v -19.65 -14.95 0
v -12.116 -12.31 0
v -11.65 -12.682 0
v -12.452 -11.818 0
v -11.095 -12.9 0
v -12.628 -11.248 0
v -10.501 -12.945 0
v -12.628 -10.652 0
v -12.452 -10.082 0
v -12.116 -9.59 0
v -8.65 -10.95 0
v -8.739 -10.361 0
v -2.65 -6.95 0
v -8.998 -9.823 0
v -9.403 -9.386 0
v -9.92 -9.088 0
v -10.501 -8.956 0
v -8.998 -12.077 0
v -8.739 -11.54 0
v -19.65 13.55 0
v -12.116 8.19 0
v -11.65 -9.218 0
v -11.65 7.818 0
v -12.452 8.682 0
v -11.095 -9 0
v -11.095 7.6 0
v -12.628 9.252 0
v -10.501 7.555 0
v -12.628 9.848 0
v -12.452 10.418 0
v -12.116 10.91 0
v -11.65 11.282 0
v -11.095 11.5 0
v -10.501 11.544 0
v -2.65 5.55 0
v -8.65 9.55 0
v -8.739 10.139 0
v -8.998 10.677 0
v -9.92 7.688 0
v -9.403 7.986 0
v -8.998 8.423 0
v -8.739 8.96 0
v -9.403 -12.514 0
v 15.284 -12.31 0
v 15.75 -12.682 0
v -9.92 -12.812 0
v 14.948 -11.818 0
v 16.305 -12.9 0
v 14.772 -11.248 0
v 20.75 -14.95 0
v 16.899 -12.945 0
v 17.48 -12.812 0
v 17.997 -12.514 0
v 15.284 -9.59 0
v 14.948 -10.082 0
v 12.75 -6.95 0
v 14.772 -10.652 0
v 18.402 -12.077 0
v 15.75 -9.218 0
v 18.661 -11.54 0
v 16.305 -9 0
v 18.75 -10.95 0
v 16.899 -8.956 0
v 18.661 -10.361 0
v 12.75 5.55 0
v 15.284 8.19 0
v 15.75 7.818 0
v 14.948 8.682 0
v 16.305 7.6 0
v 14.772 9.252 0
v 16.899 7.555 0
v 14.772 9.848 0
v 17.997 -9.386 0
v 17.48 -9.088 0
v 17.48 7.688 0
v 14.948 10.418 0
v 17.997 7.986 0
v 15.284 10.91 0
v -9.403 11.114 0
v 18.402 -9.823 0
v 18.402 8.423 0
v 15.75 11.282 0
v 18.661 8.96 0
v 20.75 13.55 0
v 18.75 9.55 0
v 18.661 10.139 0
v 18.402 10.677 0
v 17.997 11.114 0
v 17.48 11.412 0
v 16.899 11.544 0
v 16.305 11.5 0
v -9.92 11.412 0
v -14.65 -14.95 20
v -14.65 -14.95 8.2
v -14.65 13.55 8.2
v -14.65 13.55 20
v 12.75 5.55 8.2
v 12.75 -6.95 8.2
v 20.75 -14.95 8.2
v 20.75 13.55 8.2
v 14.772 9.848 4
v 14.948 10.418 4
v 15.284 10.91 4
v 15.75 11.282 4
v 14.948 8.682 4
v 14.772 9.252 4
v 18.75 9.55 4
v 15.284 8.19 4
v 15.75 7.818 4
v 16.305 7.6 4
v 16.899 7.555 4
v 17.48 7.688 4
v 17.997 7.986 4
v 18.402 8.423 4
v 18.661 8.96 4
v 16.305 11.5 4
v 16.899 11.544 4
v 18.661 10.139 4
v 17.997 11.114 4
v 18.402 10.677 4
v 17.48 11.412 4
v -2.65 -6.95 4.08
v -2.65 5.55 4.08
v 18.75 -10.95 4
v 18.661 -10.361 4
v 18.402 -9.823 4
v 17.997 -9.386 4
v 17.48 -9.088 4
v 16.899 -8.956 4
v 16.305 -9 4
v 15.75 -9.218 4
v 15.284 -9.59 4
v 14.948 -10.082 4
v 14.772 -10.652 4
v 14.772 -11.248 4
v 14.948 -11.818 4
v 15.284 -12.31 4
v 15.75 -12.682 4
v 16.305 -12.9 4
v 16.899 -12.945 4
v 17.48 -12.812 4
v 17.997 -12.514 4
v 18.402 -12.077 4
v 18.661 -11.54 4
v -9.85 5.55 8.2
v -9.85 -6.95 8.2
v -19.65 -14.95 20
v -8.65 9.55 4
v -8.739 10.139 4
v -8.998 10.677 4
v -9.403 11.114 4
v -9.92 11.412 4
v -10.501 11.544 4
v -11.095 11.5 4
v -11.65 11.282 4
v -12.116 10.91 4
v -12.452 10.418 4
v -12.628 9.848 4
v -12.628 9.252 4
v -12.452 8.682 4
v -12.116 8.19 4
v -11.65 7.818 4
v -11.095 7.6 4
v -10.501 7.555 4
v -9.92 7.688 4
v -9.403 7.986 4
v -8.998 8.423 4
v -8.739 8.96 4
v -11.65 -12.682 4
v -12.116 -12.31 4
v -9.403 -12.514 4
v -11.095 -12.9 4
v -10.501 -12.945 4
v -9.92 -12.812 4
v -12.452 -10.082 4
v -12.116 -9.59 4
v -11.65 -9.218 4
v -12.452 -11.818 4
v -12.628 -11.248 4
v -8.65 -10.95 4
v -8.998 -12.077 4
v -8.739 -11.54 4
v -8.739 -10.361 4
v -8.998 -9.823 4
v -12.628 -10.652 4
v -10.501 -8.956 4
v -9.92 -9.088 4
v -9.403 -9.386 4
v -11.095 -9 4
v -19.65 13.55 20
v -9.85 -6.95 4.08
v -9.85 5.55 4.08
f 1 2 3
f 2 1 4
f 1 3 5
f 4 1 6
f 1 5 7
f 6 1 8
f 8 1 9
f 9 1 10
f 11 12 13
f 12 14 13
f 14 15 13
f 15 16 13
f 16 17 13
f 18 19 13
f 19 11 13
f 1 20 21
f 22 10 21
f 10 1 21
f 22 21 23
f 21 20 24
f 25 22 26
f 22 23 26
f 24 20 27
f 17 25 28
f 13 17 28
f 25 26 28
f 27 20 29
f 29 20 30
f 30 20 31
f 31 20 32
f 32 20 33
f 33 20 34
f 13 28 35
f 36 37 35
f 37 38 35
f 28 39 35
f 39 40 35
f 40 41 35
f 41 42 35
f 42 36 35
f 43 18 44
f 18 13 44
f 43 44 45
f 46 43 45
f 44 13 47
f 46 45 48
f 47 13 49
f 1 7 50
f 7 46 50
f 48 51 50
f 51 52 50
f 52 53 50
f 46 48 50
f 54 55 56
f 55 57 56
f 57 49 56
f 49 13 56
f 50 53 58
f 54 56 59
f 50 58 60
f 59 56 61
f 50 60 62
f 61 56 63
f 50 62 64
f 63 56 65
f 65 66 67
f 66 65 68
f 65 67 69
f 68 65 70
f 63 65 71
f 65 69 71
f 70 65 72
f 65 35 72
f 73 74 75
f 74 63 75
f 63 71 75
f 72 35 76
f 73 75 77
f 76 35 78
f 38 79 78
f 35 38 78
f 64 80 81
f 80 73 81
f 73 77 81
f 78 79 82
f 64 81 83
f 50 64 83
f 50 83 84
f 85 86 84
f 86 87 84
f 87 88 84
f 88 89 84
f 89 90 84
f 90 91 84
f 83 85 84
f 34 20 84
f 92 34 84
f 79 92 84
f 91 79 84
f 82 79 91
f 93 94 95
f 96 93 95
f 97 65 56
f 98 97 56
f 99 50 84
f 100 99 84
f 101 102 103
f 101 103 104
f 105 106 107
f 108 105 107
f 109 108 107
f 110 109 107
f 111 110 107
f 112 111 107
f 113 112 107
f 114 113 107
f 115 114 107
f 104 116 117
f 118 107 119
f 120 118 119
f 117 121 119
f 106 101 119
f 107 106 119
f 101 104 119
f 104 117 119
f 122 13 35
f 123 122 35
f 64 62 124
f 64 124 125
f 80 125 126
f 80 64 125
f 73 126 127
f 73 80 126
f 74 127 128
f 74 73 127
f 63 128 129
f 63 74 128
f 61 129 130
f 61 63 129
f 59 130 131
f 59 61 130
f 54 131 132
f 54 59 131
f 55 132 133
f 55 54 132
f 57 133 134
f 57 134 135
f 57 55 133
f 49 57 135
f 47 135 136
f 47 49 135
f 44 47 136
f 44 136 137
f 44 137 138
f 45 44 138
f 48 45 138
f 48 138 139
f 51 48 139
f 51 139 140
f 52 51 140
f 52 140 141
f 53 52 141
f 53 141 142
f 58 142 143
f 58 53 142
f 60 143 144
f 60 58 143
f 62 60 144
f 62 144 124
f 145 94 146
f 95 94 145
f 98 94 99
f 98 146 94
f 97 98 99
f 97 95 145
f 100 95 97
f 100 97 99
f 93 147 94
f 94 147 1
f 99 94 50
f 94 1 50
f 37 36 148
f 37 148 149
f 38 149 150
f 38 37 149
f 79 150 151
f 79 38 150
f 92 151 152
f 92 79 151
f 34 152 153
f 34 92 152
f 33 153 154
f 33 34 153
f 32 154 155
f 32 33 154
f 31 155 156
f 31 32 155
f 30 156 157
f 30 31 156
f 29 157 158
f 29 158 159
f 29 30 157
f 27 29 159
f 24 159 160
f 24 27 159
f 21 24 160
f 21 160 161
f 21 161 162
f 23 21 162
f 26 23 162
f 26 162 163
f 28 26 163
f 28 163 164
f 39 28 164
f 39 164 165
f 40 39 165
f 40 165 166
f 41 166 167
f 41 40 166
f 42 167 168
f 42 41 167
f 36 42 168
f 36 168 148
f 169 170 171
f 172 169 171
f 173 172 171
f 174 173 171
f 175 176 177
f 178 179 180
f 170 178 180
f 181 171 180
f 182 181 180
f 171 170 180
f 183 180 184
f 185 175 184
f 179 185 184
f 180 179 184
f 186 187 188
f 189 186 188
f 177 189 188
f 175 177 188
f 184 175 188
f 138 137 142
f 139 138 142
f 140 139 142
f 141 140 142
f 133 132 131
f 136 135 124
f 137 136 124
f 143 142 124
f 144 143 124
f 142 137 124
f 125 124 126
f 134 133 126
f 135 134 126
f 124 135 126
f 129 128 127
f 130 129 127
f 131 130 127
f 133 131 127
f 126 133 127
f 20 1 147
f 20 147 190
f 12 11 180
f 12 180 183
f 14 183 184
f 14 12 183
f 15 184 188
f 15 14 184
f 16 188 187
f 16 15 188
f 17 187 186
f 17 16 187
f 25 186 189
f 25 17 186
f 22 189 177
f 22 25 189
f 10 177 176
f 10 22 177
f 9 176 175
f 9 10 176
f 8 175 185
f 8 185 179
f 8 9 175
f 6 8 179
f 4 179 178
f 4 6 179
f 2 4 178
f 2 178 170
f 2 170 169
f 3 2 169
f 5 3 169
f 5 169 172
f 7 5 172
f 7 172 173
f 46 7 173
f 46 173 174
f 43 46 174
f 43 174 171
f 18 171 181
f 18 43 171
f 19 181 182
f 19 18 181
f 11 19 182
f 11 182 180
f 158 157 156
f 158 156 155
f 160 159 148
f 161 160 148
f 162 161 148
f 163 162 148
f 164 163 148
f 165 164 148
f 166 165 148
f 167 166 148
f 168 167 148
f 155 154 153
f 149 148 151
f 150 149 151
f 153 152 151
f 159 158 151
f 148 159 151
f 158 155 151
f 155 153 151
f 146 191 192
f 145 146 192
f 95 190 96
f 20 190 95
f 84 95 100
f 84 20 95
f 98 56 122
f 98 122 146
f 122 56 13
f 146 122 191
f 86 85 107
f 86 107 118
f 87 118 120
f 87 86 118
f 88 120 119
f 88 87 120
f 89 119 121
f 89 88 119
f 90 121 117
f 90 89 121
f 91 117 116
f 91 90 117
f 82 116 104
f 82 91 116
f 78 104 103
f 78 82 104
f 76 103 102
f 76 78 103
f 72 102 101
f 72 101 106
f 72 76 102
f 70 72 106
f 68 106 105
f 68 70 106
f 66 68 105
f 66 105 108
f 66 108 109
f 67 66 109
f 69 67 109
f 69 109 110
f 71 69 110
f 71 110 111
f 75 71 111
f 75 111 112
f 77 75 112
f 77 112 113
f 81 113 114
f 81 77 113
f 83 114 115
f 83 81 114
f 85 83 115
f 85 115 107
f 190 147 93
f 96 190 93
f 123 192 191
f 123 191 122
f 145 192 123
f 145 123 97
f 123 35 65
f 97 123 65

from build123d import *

# Parameters (mm, degrees)
F0_W     = 35.4
F0_H     = 28.5
F0_R     = 2
F1_DEPTH = 8.2
F0_W_2   = 5
F2_DEPTH = 20
F0_W_3   = 7.2
F0_H_2   = 12.5
F3_DEPTH = 4.08
F4_DEPTH = 4


with BuildPart() as f1:
    # F0 (on Top) → F1 (new body)
    with BuildSketch(Plane.XY):
        with Locations((3.049638, -0.700136)):
            Rectangle(F0_W, F0_H)
        with Locations((-10.650362, -10.950136)):
            Circle(F0_R, mode=Mode.SUBTRACT)
        with Locations((16.749638, -10.950136)):
            Circle(F0_R, mode=Mode.SUBTRACT)
        with Locations((-10.650362, 9.549864)):
            Circle(F0_R, mode=Mode.SUBTRACT)
        Polygon((-9.850362, -6.950136), (-9.850362, 5.549864), (-2.650362, 5.549864), (12.749638, 5.549864), (12.749638, -6.950136), (-2.650362, -6.950136), align=None, mode=Mode.SUBTRACT)
        with Locations((16.749638, 9.549864)):
            Circle(F0_R, mode=Mode.SUBTRACT)
        with Locations((-10.650362, 9.549864)):
            Circle(F0_R)
        with Locations((16.749638, 9.549864)):
            Circle(F0_R)
        with Locations((16.749638, -10.950136)):
            Circle(F0_R)
        with Locations((-10.650362, -10.950136)):
            Circle(F0_R)
    extrude(amount=F1_DEPTH)

    # F0 (on Top) → F2 (join)
    with BuildSketch(Plane.XY):
        with Locations((-17.150362, -0.700136)):
            Rectangle(F0_W_2, F0_H)
    extrude(amount=F2_DEPTH)

    # F0 (on Top) → F3 (join)
    with BuildSketch(Plane.XY):
        with Locations((-6.250362, -0.700136)):
            Rectangle(F0_W_3, F0_H_2)
    extrude(amount=F3_DEPTH)

    # F0 (on Top) → F4 (cut)
    with BuildSketch(Plane.XY):
        with Locations((-10.650362, -10.950136)):
            Circle(F0_R)
        with Locations((16.749638, -10.950136)):
            Circle(F0_R)
        with Locations((16.749638, 9.549864)):
            Circle(F0_R)
        with Locations((-10.650362, 9.549864)):
            Circle(F0_R)
    extrude(amount=F4_DEPTH, mode=Mode.SUBTRACT)


solid = f1.part
